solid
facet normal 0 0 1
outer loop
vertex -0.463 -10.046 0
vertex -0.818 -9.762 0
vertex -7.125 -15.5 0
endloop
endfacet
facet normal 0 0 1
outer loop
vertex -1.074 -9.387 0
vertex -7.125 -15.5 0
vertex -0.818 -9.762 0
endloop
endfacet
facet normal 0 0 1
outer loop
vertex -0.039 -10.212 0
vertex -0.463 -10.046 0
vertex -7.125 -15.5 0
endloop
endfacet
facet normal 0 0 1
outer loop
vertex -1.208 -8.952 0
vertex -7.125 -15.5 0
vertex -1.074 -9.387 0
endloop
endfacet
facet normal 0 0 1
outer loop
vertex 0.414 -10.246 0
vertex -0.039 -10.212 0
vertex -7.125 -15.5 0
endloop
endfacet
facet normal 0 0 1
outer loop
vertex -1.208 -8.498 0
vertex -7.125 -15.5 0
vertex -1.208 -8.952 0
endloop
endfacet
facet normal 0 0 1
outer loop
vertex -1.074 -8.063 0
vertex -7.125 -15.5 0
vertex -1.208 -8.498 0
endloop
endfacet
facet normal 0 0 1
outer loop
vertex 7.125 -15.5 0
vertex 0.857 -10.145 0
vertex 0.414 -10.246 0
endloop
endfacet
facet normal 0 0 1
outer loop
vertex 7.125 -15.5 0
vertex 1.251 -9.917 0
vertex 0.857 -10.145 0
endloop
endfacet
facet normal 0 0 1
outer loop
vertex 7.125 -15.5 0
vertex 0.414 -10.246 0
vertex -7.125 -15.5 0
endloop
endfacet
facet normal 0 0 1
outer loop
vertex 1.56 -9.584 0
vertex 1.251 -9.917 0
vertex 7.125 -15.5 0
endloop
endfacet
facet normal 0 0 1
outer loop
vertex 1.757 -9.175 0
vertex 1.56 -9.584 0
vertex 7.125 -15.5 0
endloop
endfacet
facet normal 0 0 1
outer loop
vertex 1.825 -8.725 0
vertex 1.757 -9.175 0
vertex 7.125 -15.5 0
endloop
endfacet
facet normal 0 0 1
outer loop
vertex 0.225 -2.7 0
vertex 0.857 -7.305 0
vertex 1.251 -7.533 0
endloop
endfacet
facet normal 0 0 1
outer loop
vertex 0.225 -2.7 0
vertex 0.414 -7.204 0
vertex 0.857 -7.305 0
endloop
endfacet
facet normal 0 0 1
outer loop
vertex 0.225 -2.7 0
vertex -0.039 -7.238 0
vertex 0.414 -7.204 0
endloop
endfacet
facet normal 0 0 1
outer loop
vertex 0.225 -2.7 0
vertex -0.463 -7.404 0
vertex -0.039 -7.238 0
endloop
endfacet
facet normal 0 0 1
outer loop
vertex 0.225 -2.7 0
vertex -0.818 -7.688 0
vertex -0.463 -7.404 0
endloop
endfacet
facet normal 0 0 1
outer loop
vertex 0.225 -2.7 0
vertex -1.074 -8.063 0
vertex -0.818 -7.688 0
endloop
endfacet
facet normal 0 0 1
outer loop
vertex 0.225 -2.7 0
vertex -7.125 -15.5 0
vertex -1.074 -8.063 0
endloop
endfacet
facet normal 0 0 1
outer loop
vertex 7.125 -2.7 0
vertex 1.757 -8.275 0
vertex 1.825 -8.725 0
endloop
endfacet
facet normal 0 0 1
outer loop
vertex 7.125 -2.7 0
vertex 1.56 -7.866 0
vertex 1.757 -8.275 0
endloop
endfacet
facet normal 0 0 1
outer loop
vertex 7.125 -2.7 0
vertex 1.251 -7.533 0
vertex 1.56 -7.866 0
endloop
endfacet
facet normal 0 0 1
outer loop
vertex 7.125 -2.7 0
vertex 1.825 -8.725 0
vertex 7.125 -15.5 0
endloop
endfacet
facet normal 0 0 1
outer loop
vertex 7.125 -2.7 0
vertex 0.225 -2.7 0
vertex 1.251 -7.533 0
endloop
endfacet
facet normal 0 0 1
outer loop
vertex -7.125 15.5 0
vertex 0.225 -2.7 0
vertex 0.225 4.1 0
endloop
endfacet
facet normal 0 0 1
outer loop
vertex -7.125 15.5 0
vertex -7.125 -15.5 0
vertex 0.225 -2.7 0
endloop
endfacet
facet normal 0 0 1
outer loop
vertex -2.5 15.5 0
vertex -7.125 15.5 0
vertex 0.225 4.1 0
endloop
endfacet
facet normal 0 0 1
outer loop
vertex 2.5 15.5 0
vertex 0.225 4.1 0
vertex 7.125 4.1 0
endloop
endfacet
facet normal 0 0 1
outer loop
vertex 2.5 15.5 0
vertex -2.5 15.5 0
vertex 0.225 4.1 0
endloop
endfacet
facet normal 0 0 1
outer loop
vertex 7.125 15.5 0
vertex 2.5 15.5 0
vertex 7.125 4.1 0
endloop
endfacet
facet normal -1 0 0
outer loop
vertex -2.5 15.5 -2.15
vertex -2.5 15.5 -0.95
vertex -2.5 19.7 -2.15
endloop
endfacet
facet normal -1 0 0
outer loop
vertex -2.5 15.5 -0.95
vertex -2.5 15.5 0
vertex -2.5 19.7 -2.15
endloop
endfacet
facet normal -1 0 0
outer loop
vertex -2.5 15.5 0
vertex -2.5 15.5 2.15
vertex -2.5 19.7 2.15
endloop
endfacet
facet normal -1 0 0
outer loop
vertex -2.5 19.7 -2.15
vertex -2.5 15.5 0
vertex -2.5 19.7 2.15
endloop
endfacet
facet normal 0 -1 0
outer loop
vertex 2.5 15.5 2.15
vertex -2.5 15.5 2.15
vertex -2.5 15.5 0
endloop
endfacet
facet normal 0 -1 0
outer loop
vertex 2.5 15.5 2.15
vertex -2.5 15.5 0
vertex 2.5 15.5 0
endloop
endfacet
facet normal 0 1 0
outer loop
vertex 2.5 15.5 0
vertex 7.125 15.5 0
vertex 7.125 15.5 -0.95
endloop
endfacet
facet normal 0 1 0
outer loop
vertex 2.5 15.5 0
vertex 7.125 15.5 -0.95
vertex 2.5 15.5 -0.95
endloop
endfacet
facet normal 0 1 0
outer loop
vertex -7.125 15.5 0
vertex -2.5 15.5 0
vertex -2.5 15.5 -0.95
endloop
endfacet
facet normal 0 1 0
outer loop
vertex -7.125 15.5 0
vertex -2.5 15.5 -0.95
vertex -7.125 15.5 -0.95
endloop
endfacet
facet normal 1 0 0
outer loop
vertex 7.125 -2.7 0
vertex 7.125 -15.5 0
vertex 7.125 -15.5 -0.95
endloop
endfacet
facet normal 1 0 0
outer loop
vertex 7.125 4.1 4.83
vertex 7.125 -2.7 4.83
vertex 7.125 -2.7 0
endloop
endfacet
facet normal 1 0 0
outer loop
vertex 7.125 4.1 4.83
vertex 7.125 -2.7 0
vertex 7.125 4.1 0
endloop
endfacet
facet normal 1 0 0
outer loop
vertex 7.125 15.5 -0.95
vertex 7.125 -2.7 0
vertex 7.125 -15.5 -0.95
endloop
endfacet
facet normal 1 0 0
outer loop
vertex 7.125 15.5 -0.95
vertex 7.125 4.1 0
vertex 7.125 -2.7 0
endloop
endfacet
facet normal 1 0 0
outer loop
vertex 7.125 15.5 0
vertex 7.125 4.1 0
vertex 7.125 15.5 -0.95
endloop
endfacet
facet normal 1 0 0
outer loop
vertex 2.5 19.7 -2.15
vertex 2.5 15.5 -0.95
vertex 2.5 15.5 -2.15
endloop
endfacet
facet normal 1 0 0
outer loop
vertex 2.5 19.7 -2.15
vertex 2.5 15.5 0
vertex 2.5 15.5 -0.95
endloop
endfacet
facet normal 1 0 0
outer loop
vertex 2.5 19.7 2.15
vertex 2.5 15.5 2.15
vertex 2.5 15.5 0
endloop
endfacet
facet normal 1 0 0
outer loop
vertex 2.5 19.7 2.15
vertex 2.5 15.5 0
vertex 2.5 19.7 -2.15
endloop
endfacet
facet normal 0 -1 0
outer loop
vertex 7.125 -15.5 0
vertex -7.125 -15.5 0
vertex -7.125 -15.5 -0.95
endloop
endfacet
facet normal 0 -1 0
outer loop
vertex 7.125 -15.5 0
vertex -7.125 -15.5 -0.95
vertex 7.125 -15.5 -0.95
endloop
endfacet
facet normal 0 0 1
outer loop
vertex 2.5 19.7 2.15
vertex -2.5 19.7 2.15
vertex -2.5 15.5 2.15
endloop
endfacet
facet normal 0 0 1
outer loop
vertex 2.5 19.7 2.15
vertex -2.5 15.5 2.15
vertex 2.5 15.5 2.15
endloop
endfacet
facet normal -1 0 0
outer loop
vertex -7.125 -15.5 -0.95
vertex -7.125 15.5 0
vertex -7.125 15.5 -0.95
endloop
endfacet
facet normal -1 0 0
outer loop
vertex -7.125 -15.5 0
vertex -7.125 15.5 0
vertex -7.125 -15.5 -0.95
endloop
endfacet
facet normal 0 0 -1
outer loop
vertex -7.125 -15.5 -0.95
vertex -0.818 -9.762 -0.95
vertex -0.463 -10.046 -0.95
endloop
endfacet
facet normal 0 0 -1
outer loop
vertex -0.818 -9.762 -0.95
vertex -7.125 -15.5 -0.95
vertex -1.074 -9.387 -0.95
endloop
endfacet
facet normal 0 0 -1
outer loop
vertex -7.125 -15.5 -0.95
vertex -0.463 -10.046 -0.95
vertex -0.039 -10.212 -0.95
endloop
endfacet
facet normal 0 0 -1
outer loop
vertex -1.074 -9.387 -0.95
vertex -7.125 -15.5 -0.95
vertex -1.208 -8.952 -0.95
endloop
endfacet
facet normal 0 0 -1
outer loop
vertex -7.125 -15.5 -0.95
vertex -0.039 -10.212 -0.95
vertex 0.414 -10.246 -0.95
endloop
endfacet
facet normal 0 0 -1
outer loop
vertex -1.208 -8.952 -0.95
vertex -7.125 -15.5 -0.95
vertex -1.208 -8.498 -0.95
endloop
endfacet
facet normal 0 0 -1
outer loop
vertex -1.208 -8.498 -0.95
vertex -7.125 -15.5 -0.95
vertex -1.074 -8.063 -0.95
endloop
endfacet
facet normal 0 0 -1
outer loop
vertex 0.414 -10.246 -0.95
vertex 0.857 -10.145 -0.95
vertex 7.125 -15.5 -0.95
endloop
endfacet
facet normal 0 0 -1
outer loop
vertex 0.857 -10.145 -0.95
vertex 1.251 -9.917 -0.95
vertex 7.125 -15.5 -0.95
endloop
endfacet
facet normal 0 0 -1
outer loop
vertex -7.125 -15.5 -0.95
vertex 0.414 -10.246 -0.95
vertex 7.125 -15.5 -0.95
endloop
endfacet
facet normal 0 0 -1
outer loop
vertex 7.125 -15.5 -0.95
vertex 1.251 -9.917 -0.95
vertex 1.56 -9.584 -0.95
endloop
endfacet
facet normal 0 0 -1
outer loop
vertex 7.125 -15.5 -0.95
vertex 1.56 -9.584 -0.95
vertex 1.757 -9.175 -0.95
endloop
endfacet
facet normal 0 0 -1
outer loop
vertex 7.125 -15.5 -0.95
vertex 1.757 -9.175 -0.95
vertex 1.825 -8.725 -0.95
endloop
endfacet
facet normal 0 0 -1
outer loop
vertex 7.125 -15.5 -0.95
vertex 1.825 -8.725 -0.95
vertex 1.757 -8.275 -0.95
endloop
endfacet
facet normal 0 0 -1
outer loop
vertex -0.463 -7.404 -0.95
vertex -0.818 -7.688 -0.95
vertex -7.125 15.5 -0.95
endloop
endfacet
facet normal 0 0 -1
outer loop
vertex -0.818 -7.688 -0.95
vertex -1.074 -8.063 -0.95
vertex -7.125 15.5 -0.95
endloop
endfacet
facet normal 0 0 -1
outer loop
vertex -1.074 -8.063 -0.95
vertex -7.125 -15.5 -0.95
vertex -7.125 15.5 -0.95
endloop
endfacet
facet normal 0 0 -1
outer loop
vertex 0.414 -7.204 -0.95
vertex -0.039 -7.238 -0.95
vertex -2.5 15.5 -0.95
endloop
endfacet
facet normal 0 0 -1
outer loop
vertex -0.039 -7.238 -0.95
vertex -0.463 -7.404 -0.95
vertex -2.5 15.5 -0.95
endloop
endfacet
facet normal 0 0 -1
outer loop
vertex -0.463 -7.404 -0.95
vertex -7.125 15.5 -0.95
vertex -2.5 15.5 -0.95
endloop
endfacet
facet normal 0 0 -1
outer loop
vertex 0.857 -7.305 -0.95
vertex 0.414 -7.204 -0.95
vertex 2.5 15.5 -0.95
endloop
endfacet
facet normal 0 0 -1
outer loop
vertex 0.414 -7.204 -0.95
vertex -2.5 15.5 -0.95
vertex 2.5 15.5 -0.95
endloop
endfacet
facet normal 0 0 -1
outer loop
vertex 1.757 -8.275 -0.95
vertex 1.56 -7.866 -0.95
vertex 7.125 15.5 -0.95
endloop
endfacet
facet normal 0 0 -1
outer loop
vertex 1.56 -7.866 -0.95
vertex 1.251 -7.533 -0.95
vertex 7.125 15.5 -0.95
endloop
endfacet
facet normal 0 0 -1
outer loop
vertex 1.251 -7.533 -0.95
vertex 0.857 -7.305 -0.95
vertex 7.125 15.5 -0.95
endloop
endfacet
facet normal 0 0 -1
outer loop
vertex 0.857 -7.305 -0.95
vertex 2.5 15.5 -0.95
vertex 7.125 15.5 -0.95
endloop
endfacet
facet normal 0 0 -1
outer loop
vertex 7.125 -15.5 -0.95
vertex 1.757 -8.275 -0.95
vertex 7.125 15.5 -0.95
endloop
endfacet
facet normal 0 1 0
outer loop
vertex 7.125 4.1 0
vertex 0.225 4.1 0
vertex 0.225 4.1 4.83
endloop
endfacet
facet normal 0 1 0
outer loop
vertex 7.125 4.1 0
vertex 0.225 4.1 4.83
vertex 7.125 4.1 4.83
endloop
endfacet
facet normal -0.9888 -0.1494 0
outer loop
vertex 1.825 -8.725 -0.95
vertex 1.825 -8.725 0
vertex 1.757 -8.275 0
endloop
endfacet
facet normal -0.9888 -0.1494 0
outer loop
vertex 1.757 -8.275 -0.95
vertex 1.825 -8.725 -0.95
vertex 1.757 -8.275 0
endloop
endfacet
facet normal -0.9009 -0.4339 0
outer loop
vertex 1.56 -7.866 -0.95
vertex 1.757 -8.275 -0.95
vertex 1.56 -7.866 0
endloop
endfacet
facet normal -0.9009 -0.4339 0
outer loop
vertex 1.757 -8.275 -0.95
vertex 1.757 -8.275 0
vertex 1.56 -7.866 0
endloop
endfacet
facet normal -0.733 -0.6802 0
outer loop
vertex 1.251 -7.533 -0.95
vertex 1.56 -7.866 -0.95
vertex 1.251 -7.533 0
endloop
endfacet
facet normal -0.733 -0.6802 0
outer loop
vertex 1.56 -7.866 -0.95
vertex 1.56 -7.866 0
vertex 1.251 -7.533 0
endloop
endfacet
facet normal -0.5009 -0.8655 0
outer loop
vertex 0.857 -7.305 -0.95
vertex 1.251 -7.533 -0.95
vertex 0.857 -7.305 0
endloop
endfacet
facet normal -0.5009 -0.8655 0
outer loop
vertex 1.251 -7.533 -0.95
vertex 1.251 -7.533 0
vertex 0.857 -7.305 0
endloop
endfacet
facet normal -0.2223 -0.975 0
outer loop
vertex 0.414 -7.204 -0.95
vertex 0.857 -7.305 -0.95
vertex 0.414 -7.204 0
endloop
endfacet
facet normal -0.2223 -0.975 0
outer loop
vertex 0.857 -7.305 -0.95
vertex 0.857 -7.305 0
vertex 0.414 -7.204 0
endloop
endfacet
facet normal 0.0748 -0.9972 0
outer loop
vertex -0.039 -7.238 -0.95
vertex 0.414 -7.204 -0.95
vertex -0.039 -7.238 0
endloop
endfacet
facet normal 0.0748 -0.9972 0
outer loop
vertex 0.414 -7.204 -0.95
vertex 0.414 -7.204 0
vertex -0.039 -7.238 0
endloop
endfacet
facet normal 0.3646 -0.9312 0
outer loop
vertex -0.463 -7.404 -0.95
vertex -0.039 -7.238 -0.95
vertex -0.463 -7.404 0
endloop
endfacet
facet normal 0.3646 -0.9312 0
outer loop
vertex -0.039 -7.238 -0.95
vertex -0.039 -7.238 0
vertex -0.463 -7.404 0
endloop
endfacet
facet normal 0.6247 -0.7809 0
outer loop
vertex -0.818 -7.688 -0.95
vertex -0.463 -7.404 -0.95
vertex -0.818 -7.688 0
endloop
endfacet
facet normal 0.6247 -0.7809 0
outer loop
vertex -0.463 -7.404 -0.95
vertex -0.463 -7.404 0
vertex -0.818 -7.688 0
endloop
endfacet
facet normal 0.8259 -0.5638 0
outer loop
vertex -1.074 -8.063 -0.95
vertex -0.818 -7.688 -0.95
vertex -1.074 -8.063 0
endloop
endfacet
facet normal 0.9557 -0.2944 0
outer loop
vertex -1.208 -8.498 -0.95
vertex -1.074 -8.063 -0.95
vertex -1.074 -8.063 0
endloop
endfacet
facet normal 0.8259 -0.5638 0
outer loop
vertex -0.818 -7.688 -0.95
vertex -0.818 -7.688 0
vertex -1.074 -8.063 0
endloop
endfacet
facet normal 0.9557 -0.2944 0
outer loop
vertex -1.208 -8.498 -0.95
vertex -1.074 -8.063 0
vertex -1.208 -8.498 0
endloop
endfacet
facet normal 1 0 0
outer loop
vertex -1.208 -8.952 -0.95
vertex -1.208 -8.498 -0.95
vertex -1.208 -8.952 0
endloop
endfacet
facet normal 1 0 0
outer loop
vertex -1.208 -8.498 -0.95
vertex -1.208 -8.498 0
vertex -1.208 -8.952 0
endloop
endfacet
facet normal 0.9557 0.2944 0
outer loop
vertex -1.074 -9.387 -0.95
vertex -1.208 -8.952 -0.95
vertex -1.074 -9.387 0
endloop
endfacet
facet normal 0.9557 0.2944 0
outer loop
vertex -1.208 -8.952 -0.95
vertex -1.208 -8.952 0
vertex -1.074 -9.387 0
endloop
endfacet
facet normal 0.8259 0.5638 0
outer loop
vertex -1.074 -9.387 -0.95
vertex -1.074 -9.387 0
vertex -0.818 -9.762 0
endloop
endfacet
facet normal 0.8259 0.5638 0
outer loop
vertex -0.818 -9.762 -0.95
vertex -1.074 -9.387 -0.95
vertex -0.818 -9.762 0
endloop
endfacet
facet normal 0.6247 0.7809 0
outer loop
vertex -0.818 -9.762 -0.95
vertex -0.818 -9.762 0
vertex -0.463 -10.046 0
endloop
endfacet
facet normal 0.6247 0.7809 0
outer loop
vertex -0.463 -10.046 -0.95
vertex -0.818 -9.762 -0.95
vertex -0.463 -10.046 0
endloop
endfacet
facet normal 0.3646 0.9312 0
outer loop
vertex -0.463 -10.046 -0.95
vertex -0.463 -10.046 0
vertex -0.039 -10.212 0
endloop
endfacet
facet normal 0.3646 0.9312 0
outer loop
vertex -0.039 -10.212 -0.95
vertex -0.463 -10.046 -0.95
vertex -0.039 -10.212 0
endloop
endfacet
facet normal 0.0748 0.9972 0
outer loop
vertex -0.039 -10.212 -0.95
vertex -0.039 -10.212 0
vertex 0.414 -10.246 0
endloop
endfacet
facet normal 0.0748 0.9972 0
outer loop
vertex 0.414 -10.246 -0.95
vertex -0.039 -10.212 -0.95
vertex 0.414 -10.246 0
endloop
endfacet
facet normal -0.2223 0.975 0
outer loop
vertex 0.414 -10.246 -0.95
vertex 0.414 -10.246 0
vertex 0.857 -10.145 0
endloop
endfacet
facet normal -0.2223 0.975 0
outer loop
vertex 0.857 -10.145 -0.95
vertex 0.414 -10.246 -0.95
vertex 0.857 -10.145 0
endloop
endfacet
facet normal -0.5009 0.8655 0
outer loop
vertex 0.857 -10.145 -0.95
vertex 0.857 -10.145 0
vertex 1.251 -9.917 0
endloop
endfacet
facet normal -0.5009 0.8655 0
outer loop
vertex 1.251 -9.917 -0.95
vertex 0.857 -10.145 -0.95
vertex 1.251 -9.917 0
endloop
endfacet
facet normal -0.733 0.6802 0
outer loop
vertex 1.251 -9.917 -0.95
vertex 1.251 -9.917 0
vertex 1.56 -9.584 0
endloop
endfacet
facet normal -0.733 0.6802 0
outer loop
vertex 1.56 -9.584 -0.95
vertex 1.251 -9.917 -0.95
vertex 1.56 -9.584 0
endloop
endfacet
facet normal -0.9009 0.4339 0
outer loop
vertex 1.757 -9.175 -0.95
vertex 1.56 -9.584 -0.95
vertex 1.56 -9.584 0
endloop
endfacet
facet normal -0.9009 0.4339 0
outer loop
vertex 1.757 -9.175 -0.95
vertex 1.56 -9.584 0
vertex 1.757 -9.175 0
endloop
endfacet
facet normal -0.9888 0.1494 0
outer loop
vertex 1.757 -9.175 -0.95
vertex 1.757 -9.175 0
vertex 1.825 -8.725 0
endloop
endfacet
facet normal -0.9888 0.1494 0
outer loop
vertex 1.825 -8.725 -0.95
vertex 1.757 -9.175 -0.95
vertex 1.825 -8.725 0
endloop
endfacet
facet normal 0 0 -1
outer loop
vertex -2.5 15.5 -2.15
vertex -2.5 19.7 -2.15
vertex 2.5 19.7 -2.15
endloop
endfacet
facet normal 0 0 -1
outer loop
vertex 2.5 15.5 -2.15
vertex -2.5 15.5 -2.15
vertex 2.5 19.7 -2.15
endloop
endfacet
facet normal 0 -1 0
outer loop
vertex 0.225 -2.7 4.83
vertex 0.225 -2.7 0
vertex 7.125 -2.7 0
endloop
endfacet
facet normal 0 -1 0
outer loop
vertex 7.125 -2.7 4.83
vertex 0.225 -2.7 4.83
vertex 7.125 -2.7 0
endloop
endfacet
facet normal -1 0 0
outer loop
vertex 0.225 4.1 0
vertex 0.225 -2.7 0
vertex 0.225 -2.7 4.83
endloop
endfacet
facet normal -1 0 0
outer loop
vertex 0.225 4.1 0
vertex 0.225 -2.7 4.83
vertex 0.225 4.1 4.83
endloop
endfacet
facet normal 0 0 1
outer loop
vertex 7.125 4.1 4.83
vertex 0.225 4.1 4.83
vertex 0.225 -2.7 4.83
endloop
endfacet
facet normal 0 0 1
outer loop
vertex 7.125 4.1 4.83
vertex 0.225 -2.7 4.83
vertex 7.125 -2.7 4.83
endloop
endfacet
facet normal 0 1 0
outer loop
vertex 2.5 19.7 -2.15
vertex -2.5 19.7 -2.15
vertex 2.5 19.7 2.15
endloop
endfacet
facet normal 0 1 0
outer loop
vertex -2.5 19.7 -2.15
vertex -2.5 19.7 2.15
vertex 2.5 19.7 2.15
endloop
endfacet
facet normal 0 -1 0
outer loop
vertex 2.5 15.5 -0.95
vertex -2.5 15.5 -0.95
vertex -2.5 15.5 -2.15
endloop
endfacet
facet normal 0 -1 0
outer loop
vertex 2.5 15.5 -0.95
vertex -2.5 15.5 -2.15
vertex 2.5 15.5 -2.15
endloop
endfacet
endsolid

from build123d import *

# Parameters (mm, degrees)
BOSS_EXTRUDE1_DEPTH = 0.95
SKETCH1_4_W         = 5
SKETCH1_4_H         = 4.2
BOSS_EXTRUDE2_DEPTH = 2.15
SKETCH3_W           = 6.9
SKETCH3_H           = 6.8
BOSS_EXTRUDE3_DEPTH = 4.83
SKETCH4_R           = 1.525
CUT_EXTRUDE1_DEPTH  = 3.15


with BuildPart() as part:
    # Sketch1 → Boss-Extrude1 (new body)
    with BuildSketch(Plane.XY):
        Polygon((-2.5, 15.5), (-7.125, 15.5), (-7.125, -15.5), (7.125, -15.5), (7.125, 15.5), (2.5, 15.5), align=None)
    extrude(amount=-BOSS_EXTRUDE1_DEPTH)

    # Sketch1<4> → Boss-Extrude2 (add, symmetric)
    with BuildSketch(Plane.XY):
        with Locations((0, 17.6)):
            Rectangle(SKETCH1_4_W, SKETCH1_4_H)
    extrude(amount=BOSS_EXTRUDE2_DEPTH, both=True)

    # Sketch3 → Boss-Extrude3 (add)
    with BuildSketch(Plane.XY):
        with Locations((3.675, 0.7)):
            Rectangle(SKETCH3_W, SKETCH3_H)
    extrude(amount=BOSS_EXTRUDE3_DEPTH)

    # Sketch4 → Cut-Extrude1 (cut, through all)
    with BuildSketch(Plane.XY):
        with Locations((0.3, -8.725)):
            Circle(SKETCH4_R)
    extrude(amount=-CUT_EXTRUDE1_DEPTH, mode=Mode.SUBTRACT)


solid = part.part
